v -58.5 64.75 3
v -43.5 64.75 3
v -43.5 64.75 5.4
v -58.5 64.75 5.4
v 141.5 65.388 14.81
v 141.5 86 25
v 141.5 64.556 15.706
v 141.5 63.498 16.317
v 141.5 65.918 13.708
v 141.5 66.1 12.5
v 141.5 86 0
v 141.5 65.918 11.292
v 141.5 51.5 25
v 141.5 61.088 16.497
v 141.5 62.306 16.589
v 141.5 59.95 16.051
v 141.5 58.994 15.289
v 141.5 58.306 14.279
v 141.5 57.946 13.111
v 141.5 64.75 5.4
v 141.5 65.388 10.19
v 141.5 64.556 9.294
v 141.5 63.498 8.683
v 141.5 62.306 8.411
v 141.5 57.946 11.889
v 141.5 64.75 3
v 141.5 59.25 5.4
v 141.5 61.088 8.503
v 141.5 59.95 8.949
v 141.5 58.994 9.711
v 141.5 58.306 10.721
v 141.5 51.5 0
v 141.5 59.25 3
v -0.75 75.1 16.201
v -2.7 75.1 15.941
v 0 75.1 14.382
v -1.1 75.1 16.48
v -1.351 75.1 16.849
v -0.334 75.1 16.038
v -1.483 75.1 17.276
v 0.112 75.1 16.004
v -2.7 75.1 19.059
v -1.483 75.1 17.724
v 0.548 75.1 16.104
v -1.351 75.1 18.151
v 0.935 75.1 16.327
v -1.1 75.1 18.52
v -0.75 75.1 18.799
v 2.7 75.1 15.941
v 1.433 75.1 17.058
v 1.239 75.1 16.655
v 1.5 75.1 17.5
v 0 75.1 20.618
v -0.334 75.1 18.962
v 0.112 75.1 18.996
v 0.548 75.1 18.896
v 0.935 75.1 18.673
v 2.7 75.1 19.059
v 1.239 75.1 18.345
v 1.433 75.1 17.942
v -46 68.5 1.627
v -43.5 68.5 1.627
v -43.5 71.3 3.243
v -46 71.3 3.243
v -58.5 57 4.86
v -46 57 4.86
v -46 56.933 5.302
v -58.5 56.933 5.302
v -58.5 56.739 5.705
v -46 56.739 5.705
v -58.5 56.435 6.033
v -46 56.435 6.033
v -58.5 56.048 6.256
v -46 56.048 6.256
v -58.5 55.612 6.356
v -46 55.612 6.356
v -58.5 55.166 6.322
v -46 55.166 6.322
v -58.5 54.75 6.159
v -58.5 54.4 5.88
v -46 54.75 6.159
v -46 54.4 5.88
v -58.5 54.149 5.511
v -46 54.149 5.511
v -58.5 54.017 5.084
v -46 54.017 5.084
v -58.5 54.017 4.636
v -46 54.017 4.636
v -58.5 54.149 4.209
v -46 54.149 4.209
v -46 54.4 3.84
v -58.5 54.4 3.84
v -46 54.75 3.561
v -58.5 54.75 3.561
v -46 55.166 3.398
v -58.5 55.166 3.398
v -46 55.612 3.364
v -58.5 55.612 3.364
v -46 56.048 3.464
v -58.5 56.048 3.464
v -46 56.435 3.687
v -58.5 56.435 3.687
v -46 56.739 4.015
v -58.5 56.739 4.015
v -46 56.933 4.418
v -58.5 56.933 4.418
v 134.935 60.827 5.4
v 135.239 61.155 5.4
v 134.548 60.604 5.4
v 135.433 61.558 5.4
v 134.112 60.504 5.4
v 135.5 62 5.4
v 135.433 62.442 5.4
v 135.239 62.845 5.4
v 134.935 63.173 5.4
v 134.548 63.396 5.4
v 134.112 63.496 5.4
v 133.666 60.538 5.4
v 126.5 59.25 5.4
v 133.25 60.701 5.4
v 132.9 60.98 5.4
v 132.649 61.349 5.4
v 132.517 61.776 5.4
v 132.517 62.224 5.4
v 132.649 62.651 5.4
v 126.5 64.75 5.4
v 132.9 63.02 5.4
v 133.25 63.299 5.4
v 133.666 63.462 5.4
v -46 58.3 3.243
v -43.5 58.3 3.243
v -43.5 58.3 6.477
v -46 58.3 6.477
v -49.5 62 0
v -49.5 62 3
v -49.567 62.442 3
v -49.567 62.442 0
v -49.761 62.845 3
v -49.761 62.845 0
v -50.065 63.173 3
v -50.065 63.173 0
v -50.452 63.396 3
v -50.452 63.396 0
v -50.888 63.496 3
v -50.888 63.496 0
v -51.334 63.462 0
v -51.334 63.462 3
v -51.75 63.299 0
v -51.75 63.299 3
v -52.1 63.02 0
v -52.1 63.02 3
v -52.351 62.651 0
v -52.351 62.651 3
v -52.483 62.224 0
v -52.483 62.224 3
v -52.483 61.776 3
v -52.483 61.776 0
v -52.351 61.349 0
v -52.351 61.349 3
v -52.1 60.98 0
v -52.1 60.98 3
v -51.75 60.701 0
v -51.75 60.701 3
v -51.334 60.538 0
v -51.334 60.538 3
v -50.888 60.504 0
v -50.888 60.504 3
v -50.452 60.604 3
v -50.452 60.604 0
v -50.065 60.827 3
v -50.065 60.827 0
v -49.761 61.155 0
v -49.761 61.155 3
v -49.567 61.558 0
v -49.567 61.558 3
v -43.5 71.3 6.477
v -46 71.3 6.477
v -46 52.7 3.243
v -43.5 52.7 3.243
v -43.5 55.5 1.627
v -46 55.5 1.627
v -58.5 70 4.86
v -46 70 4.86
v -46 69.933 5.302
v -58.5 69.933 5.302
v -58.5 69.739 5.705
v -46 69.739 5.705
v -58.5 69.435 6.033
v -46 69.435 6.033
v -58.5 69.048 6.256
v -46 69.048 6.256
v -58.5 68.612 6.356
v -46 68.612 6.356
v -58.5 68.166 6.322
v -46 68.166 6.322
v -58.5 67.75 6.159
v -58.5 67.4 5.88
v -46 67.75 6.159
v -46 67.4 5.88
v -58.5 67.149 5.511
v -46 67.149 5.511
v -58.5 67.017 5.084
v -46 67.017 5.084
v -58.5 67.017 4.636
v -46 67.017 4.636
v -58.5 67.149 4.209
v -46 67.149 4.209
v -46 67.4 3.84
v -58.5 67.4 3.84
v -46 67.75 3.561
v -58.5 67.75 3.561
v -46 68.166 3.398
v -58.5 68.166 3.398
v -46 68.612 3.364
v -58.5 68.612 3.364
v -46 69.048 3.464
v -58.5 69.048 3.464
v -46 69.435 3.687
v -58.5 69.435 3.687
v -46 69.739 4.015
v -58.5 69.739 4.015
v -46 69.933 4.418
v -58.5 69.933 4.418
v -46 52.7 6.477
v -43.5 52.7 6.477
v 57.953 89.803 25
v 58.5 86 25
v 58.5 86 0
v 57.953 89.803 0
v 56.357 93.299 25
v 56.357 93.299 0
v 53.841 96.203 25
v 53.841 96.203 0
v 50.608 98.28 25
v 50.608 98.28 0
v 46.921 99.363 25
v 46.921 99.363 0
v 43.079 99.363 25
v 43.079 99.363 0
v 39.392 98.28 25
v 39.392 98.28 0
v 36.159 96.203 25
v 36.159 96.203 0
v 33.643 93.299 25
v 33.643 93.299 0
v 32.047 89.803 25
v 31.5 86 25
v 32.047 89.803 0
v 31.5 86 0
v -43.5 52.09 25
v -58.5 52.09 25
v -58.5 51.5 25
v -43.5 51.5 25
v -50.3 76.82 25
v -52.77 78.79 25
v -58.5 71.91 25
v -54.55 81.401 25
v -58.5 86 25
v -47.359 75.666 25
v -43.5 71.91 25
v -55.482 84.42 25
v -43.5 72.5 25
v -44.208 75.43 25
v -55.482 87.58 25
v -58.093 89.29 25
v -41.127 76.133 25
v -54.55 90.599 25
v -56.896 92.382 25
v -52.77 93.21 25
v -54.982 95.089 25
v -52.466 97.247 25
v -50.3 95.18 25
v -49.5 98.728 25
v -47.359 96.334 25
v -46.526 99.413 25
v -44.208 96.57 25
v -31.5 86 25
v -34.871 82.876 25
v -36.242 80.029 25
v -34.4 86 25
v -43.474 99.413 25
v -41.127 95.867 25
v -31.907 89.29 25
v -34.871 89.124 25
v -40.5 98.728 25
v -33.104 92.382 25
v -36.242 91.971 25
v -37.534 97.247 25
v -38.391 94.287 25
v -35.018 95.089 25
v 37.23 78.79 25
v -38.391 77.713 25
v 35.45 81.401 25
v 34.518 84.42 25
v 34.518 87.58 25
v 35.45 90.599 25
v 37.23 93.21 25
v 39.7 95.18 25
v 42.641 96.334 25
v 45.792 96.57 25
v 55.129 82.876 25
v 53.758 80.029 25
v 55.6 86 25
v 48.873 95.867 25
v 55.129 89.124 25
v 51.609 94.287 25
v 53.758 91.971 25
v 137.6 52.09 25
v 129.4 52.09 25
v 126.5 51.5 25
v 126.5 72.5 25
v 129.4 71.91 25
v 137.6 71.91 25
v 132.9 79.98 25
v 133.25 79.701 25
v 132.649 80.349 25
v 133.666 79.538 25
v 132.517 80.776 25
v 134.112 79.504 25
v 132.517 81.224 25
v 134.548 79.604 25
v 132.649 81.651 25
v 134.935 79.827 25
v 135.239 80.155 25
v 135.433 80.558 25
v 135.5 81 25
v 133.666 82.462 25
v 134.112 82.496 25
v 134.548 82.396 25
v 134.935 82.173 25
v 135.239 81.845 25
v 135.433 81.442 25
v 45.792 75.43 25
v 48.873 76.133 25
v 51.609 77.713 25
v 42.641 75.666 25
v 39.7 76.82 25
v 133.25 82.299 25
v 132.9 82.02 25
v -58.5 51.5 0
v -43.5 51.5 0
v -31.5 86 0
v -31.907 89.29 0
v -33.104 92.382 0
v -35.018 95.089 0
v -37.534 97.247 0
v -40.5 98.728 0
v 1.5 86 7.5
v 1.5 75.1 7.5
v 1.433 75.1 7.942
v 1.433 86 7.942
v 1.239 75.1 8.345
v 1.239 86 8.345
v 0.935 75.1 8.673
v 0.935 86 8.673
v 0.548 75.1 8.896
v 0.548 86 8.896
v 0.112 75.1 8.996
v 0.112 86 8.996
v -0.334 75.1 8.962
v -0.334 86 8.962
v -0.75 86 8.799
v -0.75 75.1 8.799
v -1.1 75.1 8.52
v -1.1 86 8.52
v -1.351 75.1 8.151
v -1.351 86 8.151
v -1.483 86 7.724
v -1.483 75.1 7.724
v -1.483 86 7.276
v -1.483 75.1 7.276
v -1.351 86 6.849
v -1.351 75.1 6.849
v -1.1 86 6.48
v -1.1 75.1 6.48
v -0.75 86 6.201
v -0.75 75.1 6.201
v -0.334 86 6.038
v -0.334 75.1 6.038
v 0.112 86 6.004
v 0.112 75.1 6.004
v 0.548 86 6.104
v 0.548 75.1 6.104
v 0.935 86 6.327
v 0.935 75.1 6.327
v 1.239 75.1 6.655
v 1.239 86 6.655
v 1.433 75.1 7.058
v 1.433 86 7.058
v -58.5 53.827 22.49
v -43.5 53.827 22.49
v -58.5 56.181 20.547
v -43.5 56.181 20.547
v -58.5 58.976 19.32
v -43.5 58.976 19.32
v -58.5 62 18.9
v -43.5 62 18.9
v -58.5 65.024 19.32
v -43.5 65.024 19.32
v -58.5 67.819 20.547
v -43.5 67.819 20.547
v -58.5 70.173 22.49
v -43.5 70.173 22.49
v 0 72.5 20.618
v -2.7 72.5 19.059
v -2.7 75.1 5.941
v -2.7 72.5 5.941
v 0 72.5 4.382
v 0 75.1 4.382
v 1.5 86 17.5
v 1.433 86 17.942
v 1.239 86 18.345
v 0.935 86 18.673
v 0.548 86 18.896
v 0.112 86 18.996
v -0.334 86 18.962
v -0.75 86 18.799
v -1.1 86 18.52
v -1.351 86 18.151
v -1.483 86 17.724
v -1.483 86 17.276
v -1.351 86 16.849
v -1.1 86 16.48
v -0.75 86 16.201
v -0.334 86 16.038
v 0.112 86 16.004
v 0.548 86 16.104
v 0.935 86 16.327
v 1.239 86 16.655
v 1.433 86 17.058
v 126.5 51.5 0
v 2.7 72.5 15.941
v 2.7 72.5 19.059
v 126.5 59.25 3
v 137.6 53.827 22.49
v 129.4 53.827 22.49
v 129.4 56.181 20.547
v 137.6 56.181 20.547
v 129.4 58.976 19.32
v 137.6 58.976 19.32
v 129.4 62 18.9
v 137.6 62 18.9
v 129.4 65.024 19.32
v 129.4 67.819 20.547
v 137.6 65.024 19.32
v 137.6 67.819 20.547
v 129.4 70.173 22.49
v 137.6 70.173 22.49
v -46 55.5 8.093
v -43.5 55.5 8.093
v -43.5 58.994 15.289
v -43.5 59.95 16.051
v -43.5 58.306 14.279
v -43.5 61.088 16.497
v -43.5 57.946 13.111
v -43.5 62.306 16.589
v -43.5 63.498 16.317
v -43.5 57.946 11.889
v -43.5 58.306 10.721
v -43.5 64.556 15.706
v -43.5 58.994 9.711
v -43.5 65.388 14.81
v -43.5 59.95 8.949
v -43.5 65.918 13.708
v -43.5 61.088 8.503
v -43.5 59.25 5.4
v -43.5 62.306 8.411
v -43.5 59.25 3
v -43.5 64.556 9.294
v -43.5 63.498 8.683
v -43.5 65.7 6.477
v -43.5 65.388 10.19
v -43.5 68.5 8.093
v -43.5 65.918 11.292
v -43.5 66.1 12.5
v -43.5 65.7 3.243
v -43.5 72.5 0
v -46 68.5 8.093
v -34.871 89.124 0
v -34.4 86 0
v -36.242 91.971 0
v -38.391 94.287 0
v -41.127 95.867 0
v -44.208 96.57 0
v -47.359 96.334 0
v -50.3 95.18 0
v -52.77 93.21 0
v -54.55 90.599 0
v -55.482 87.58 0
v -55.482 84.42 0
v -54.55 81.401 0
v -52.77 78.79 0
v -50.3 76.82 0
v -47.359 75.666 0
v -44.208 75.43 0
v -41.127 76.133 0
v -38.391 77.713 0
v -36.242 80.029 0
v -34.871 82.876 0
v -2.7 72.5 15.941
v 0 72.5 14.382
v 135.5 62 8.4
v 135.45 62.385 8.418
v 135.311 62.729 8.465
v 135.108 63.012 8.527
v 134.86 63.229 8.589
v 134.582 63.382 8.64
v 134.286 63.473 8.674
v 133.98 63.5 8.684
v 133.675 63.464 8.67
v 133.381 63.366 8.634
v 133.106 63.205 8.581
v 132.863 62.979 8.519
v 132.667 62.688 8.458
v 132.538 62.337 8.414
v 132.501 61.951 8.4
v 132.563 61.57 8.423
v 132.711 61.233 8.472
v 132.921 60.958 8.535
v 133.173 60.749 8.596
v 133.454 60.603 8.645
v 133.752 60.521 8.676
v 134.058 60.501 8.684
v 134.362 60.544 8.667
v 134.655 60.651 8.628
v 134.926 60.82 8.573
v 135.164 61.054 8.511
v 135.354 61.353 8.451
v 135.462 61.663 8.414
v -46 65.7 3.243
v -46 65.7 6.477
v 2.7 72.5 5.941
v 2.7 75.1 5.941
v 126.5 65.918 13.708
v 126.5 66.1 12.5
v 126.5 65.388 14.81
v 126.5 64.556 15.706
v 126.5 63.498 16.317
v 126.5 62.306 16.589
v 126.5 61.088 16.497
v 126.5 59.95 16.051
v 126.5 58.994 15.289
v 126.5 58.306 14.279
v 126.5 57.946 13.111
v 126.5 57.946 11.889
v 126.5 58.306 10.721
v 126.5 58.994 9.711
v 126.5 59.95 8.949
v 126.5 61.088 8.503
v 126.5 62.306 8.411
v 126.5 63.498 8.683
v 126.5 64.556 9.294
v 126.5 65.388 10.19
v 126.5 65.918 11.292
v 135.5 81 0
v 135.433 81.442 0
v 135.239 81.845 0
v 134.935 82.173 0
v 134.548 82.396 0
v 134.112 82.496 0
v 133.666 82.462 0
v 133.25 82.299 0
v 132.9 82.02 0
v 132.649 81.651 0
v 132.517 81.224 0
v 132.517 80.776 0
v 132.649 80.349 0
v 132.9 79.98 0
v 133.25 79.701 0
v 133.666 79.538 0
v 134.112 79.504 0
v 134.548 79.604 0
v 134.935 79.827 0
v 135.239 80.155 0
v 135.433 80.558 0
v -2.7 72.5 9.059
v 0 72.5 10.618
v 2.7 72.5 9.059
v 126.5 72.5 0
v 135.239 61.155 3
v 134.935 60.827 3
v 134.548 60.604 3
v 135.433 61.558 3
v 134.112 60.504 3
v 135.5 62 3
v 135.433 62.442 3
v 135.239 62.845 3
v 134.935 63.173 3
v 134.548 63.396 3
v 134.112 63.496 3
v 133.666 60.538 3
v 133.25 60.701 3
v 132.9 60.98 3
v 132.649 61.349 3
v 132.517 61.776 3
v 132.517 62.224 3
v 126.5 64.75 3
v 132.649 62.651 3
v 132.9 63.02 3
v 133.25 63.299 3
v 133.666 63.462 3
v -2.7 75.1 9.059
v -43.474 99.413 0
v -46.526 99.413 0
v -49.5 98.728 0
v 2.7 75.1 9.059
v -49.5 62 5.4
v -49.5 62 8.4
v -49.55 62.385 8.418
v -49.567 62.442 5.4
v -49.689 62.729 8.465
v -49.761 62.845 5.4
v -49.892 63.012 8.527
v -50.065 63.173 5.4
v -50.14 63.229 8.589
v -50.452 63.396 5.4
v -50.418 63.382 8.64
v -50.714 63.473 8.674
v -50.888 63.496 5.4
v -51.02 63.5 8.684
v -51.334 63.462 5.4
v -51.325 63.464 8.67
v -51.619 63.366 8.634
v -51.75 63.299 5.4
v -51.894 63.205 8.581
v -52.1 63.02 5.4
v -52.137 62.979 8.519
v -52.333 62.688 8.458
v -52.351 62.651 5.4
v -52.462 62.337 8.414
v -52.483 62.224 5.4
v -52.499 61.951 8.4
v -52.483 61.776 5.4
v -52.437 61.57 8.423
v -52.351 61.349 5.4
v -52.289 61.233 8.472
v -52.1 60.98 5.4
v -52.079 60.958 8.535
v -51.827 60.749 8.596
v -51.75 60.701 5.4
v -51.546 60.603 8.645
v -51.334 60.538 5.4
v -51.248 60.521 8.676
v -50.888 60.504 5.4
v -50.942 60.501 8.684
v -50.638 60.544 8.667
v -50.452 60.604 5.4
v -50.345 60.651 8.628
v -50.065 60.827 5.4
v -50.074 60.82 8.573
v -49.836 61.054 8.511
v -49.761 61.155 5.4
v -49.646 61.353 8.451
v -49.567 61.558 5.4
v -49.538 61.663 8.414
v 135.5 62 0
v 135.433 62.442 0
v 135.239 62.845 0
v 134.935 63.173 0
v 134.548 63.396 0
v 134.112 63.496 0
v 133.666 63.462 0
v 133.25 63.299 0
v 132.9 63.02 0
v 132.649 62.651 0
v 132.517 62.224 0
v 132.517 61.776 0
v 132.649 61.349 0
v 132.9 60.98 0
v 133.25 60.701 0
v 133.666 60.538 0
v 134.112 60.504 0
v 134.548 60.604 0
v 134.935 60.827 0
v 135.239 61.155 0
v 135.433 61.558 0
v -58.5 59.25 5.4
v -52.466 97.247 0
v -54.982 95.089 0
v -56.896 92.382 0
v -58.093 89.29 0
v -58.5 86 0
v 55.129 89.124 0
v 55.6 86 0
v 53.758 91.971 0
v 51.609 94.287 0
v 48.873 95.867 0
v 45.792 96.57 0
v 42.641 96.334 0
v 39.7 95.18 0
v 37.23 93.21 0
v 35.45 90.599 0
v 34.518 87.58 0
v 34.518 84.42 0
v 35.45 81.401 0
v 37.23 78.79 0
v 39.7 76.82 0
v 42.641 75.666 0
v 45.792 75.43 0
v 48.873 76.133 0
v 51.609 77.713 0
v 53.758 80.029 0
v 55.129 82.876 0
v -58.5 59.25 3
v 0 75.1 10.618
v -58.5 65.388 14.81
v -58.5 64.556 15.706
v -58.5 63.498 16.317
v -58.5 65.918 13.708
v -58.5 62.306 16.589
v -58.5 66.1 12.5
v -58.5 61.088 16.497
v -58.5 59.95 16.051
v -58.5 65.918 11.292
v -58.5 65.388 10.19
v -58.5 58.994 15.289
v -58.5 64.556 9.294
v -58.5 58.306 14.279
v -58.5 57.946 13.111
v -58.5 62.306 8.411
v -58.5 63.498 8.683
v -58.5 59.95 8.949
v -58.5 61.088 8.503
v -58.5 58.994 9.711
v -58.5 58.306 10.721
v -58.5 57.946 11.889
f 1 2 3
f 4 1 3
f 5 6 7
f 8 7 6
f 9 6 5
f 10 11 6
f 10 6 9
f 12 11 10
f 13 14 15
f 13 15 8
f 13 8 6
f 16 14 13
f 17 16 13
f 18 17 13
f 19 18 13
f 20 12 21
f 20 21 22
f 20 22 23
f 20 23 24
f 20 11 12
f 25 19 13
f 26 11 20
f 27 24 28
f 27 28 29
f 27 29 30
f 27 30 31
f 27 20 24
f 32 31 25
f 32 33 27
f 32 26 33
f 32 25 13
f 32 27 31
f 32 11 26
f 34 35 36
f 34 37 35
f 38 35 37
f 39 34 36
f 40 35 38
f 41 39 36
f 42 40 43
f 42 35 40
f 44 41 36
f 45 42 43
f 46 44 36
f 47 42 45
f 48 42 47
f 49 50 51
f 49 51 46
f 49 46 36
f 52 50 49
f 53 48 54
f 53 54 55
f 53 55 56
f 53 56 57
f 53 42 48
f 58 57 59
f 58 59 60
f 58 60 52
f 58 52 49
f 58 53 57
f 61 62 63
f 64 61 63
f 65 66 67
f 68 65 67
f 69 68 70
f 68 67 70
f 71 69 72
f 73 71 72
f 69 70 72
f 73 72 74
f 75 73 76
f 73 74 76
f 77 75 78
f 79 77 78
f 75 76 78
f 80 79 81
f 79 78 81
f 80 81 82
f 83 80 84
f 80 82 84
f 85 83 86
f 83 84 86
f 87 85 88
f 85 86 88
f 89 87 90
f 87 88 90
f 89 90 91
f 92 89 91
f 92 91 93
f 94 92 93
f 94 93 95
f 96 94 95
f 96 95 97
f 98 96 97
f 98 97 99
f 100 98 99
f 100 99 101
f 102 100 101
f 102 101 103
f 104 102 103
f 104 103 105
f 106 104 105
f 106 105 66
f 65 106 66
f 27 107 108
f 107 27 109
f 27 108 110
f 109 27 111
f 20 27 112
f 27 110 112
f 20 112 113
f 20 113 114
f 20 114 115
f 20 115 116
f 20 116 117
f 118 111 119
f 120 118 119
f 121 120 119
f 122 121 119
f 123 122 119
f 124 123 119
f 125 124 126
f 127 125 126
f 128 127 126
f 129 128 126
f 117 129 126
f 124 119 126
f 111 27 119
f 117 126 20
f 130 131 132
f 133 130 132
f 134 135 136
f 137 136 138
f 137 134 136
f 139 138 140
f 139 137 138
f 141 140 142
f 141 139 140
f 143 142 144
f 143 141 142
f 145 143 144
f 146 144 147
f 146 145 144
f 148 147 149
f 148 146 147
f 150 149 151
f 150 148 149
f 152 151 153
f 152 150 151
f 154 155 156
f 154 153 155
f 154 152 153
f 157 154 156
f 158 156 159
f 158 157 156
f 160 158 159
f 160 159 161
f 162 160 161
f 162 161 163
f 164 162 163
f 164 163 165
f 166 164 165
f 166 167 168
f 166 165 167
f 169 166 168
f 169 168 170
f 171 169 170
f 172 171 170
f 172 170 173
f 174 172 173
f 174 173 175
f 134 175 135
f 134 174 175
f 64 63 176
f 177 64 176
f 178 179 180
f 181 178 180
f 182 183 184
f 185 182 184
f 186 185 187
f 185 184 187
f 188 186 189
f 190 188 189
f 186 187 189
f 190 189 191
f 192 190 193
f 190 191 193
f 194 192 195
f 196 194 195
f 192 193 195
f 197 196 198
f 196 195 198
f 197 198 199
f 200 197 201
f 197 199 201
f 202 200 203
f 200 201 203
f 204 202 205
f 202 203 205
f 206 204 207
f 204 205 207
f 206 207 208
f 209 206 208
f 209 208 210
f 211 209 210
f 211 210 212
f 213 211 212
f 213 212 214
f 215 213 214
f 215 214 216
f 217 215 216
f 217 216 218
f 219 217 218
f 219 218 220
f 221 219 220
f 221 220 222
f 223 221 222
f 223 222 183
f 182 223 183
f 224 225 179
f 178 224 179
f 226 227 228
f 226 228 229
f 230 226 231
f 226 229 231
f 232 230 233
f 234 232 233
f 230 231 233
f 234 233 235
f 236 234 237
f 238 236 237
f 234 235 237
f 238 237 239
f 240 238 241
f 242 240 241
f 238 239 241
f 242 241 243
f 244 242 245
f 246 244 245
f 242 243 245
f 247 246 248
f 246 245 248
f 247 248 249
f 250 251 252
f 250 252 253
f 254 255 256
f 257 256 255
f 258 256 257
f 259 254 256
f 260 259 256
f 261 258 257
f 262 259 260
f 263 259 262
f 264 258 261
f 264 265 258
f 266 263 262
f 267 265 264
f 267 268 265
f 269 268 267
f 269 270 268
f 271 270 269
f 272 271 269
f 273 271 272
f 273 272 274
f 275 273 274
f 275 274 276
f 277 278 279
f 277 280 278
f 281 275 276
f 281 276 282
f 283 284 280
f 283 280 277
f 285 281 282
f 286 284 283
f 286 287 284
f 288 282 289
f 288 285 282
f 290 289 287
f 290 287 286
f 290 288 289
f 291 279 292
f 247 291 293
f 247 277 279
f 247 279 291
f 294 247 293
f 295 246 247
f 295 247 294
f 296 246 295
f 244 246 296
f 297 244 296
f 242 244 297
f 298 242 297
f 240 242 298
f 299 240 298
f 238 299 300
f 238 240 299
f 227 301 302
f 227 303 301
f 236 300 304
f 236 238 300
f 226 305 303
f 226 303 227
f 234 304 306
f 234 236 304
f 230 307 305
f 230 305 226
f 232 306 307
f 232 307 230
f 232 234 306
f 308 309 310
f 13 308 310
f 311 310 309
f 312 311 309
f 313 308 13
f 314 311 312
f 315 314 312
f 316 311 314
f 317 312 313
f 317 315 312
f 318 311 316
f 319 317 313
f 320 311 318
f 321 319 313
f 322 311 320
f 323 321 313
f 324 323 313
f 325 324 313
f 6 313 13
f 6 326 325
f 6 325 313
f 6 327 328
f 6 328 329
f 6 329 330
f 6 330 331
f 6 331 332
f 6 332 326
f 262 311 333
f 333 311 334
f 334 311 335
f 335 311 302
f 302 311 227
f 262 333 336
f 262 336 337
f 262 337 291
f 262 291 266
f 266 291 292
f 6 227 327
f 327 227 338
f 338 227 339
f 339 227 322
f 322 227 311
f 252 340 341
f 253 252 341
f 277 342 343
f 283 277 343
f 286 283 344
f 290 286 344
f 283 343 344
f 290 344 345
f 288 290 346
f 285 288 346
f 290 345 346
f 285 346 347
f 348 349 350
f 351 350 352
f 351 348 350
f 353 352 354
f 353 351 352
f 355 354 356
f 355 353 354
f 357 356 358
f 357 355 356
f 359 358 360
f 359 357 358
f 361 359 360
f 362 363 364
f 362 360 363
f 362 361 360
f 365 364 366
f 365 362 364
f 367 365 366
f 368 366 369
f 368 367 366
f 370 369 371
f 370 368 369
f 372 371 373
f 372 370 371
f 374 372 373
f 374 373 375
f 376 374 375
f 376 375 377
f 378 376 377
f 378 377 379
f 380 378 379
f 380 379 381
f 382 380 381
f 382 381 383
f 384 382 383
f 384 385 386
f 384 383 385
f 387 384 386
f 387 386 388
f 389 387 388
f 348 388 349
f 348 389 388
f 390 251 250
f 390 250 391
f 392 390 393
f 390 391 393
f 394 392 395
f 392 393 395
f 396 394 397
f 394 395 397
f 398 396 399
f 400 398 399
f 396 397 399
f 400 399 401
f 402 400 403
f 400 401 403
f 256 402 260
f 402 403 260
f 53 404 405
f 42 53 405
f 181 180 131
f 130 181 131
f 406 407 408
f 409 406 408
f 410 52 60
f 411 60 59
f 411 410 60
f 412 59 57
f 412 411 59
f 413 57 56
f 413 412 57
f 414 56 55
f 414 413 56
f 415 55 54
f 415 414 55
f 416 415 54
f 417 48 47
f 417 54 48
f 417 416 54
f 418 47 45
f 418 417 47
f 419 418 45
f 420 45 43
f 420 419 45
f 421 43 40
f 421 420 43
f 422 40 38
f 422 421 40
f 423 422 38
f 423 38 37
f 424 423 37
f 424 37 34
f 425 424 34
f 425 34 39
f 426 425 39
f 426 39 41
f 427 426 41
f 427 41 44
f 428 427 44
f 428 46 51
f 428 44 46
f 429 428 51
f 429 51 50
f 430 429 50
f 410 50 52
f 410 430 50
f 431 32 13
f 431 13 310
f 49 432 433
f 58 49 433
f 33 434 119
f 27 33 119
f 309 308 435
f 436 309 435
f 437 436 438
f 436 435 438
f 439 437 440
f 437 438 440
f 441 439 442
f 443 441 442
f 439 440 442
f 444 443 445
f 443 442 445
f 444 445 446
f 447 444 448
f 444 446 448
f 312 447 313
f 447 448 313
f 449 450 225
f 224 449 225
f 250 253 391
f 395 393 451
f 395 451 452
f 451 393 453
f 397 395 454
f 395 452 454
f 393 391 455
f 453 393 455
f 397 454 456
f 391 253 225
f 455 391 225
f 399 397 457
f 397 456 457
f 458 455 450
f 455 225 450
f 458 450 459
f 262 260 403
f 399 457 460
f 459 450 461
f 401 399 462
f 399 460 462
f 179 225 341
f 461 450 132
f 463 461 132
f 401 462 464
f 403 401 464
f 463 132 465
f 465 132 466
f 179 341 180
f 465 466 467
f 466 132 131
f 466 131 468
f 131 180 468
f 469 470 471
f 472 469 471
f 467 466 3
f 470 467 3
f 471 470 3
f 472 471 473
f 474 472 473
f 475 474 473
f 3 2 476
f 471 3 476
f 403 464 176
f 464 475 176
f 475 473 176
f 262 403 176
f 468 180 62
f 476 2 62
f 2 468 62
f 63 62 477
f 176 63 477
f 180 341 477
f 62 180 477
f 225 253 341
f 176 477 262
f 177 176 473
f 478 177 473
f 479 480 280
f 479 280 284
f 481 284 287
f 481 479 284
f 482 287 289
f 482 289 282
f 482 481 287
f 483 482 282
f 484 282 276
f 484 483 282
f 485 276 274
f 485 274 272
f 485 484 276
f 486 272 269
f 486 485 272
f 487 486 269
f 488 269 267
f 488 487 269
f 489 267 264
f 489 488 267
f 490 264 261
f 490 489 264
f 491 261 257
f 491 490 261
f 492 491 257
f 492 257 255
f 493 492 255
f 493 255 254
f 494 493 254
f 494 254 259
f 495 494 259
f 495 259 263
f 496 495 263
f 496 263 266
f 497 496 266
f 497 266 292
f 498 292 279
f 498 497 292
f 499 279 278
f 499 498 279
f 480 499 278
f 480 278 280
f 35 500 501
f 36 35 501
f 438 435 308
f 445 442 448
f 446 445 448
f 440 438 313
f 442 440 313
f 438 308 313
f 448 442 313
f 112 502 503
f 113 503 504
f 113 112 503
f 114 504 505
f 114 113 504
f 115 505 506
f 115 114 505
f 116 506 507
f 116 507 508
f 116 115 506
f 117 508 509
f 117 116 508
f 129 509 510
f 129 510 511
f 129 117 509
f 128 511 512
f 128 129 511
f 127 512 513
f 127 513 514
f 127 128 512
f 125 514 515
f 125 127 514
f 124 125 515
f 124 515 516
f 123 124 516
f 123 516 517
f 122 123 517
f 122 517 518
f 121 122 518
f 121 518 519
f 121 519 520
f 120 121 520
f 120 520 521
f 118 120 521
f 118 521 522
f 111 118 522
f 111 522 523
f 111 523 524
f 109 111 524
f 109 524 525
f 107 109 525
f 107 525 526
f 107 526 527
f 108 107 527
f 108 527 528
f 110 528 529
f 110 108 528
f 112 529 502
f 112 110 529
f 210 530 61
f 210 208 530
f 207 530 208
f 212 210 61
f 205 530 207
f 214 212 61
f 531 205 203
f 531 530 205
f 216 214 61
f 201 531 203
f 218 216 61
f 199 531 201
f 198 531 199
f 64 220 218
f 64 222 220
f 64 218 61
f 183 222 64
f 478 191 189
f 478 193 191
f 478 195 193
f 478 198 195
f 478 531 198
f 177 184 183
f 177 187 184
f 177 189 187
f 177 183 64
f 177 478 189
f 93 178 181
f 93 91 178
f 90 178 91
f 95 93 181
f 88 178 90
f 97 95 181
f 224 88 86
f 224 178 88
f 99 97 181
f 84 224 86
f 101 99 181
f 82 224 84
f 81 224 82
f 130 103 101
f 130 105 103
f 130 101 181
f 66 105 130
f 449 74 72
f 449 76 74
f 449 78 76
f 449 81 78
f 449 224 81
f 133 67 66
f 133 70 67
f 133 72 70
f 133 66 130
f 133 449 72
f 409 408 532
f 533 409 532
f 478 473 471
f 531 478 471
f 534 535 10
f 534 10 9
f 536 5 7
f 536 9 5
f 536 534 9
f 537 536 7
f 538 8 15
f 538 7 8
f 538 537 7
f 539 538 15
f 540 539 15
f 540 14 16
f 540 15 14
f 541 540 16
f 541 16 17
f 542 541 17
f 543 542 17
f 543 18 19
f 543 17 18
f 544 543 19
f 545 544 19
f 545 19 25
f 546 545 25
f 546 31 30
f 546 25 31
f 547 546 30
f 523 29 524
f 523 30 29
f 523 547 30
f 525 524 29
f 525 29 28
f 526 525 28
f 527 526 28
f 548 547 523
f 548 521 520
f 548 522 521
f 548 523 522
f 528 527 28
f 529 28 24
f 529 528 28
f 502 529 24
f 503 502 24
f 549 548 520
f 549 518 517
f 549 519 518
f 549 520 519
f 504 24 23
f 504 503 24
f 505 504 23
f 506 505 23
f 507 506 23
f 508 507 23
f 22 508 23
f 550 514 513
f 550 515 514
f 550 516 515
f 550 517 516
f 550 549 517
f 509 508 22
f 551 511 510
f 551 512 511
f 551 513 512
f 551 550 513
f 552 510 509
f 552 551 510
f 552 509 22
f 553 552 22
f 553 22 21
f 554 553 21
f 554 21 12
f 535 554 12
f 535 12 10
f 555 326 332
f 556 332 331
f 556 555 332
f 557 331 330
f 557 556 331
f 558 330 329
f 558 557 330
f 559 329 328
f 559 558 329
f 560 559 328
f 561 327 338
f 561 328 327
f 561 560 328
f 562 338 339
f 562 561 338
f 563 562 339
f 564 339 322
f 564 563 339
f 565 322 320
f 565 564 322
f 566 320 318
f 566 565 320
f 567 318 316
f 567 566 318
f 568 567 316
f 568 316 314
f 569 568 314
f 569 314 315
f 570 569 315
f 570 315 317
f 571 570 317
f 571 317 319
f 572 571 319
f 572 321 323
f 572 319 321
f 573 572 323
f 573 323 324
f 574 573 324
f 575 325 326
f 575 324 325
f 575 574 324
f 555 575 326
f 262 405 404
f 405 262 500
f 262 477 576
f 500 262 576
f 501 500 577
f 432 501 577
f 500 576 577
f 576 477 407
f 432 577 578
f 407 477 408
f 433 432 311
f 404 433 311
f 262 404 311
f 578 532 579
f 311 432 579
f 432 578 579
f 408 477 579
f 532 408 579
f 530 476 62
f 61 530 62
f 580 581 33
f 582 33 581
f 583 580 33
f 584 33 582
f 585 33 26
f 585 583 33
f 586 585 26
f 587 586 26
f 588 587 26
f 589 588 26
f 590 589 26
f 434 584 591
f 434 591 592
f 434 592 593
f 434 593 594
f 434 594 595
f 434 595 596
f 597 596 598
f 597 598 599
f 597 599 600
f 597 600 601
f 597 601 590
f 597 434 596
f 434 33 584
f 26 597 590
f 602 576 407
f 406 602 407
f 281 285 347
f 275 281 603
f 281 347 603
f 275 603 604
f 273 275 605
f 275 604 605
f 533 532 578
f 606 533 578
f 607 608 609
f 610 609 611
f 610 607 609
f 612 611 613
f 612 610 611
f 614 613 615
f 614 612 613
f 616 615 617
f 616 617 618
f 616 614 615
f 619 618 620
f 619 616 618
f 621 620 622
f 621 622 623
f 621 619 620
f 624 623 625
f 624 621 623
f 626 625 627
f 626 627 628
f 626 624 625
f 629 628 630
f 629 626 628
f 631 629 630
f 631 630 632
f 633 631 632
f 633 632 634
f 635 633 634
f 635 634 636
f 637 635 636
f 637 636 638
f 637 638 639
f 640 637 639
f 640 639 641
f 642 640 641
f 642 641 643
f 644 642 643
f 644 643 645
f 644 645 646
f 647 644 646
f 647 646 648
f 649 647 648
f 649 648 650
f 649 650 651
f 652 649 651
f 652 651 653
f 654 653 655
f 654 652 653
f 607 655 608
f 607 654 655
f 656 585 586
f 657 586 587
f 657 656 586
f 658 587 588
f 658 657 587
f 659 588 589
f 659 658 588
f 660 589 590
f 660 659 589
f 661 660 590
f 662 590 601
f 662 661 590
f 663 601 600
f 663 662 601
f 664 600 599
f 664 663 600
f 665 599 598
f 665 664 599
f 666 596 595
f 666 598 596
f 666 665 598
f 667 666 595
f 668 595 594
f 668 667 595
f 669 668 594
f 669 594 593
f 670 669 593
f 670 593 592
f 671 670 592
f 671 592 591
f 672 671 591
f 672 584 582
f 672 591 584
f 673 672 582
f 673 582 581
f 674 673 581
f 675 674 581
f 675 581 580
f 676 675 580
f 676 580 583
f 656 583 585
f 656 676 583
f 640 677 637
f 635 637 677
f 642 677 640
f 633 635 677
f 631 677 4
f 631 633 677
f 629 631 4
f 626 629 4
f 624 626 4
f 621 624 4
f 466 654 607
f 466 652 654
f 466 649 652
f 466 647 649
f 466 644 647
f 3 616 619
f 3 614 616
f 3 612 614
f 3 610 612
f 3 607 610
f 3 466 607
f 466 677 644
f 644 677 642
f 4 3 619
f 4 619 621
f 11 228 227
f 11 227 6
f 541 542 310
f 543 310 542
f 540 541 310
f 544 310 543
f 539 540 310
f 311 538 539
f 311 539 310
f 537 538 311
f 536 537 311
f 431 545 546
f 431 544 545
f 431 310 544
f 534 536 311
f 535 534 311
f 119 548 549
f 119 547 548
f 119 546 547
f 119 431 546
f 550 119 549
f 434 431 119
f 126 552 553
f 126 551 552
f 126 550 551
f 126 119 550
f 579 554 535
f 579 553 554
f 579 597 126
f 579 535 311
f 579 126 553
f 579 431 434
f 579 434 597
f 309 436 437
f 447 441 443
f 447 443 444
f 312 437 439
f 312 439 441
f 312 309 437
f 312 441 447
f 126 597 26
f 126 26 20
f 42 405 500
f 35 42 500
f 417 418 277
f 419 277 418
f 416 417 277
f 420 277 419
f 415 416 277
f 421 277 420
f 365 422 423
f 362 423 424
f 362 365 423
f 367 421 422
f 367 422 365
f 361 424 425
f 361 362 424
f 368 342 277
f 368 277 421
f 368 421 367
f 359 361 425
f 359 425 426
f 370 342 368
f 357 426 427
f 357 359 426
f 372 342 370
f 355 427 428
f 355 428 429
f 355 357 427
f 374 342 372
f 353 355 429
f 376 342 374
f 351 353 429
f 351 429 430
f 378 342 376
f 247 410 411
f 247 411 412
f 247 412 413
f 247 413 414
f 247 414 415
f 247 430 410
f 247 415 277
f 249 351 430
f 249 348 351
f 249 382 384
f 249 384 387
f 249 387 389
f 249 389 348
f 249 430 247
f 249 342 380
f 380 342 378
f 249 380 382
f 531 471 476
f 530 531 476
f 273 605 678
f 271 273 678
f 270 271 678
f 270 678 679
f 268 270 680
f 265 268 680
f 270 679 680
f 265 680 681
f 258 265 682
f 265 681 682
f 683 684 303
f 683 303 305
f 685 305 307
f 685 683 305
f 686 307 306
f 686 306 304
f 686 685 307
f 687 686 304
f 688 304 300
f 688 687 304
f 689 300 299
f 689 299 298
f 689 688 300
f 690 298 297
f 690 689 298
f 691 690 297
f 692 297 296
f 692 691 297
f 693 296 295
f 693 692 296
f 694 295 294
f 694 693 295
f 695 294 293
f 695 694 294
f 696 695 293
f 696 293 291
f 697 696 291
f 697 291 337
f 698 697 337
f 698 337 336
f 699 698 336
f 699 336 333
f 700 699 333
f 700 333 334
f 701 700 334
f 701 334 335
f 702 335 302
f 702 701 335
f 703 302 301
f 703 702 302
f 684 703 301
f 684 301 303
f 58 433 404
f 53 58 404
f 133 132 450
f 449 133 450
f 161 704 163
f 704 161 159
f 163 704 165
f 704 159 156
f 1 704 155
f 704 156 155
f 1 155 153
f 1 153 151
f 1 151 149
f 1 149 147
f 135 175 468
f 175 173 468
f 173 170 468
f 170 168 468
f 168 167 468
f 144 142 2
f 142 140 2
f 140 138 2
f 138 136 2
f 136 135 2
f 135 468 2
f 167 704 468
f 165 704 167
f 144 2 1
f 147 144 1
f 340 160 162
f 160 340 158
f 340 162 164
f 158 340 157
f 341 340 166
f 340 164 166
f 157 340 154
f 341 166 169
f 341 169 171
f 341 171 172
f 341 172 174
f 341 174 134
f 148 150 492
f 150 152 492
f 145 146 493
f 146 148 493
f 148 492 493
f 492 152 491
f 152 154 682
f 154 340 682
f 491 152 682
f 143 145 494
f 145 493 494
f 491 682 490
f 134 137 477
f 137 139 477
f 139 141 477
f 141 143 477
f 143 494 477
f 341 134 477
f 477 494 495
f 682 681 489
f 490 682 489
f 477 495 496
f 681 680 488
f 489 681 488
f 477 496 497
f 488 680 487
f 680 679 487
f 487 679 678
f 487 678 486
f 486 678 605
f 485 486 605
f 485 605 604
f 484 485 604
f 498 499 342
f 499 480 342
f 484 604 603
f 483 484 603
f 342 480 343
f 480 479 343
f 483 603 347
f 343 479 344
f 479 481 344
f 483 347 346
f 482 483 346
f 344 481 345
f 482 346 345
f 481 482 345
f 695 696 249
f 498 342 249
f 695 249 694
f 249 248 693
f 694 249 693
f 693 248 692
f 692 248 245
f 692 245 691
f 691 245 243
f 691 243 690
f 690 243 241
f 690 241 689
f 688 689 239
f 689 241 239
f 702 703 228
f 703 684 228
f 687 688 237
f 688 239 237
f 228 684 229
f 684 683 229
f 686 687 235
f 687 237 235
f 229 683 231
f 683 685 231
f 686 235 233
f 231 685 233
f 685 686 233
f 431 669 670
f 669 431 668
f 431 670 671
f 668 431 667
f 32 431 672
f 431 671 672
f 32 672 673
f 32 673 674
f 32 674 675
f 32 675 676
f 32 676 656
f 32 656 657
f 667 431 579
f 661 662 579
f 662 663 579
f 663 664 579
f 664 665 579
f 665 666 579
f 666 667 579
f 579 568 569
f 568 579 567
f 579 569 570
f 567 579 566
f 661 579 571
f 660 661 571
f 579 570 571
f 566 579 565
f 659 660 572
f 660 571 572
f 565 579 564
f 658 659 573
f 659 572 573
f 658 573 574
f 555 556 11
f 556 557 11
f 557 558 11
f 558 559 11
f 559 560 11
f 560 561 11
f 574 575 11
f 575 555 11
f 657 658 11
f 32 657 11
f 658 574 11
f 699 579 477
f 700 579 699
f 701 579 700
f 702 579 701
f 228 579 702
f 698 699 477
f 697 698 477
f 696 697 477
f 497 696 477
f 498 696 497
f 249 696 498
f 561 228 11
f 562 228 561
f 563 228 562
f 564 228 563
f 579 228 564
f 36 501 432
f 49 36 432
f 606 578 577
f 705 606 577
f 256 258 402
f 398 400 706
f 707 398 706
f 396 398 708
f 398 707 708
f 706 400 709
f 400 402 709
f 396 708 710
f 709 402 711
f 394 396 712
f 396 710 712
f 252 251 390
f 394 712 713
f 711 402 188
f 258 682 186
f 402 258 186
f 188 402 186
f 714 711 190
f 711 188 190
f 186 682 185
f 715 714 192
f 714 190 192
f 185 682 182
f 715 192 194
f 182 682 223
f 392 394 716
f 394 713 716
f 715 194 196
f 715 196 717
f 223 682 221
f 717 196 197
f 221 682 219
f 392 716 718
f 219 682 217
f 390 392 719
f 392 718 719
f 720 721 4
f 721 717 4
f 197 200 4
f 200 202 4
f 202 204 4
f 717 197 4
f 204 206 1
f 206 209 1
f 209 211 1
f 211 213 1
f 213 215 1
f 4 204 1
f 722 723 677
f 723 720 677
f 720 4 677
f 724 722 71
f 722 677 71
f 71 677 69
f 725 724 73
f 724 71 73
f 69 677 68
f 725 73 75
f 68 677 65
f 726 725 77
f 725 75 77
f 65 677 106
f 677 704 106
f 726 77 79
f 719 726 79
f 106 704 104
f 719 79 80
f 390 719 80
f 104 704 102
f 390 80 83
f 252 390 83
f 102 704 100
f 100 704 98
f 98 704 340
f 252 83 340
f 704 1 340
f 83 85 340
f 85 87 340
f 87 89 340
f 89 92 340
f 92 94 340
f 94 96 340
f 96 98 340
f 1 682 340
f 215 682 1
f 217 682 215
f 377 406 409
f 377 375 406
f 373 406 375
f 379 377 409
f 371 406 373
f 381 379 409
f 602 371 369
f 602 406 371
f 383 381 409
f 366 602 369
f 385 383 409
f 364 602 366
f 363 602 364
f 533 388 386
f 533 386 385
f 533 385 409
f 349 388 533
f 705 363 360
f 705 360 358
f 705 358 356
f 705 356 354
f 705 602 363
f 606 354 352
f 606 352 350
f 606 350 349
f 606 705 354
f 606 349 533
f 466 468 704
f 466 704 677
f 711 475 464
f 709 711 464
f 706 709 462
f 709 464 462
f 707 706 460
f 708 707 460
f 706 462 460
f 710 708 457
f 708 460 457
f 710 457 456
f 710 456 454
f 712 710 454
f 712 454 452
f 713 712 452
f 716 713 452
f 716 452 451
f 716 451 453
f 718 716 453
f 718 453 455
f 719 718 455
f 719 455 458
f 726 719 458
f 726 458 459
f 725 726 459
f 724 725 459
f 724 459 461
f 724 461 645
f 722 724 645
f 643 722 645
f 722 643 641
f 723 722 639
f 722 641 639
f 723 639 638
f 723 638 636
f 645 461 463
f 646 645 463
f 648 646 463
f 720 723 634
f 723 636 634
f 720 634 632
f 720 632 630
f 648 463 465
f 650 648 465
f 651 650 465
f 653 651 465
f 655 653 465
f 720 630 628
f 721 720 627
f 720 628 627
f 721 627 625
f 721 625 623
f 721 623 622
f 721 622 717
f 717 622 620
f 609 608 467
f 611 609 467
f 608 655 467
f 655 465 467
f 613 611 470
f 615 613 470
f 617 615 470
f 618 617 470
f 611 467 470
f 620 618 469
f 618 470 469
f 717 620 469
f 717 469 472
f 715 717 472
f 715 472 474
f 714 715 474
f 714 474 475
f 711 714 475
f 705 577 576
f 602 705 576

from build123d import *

# Parameters (mm, degrees)
SKETCH007_R          = 10.6
PAD006_DEPTH         = 25
SKETCH016_R          = 4.1
SKETCH016_W          = 5.5
SKETCH016_H          = 2.4
POCKET008_DEPTH      = 58.501
POCKET008_DEPTH_BACK = 141.501
SKETCH024_R          = 11.1
SKETCH024_R_2        = 4.09
POCKET013_DEPTH      = 4.1
SKETCH025_R          = 1.5
POCKET014_DEPTH      = 13.501
POCKET014_DEPTH_BACK = 34.501
POCKET015_DEPTH      = 2.6
SKETCH027_R          = 1.5
POCKET016_DEPTH      = 12.5
SKETCH028_R          = 1.5
POCKET017_DEPTH      = 58.5010001
POCKET018_DEPTH      = 2.5
SKETCH032_R          = 1.5
POCKET019_DEPTH      = 0.001
POCKET019_DEPTH_BACK = 25.001
SKETCH033_R          = 11.1
POCKET020_DEPTH      = 58.5010001


with BuildPart() as part:
    # Sketch007 → Pad006 (new body)
    with BuildSketch(Plane.XY):
        with BuildLine():
            ThreePointArc((-31.5, 0), (-33.9772961575, 7.7942286341), (-40.5, 12.7279220614))
            ThreePointArc((-40.5, 12.7279220614), (-45, 13.5), (-49.5, 12.7279220614))
            ThreePointArc((-49.5, 12.7279220614), (-56.0227038425, 7.7942286341), (-58.5, 0))
            Line((-58.5, 0), (-58.5, -13.5))
            Line((-58.5, -17.2720779386), (-58.5, -13.5))
            Line((-58.5, -17.2720779386), (-58.5, -34.5))
            Line((-58.5, -34.5), (-43.5, -34.5))
            Line((-43.5, -34.5), (-43.5, -17.2720779386))
            Line((-43.5, -13.5), (-43.5, -17.2720779386))
            Line((-43.5, -13.5), (126.5, -13.5))
            Line((126.5, -34.5), (126.5, -13.5))
            Line((141.5, -34.5), (126.5, -34.5))
            Line((141.5, -13.5), (141.5, -34.5))
            Line((141.5, 0), (141.5, -13.5))
            Line((126.5, 0), (141.5, 0))
            Line((58.5, 0), (126.5, 0))
            ThreePointArc((58.5, 0), (45, 13.5), (31.5, 0))
            Line((-31.5, 0), (31.5, 0))
        make_face()
        with Locations((-45, 0)):
            Circle(SKETCH007_R, mode=Mode.SUBTRACT)
        with Locations((45, 0)):
            Circle(SKETCH007_R, mode=Mode.SUBTRACT)
    extrude(amount=PAD006_DEPTH)

    # Sketch016 → Pocket008 (cut, two sides)
    with BuildSketch(Plane.YZ) as pocket008_sk:
        with Locations((-24, 12.5)):
            Circle(SKETCH016_R)
        with Locations((-24, 4.2)):
            Rectangle(SKETCH016_W, SKETCH016_H)
    extrude(amount=-POCKET008_DEPTH, mode=Mode.SUBTRACT)
    extrude(pocket008_sk.sketch, amount=POCKET008_DEPTH_BACK, mode=Mode.SUBTRACT)

    # Sketch024 → Pocket013 (cut, symmetric)
    with BuildSketch(Plane.YZ.offset(133.5)):
        with Locations((-24, 30)):
            Circle(SKETCH024_R)
        with Locations((-24, 30)):
            Circle(SKETCH024_R_2, mode=Mode.SUBTRACT)
    extrude(amount=POCKET013_DEPTH, both=True, mode=Mode.SUBTRACT)

    # Sketch025 → Pocket014 (cut, two sides)
    with BuildSketch(Plane.XZ) as pocket014_sk:
        with Locations((0, 17.5)):
            Circle(SKETCH025_R)
        with Locations((0, 7.5)):
            Circle(SKETCH025_R)
    extrude(amount=-POCKET014_DEPTH, mode=Mode.SUBTRACT)
    extrude(pocket014_sk.sketch, amount=POCKET014_DEPTH_BACK, mode=Mode.SUBTRACT)

    # Sketch026 → Pocket015 (cut)
    with BuildSketch(Plane.XZ.offset(13.5)):
        Polygon((2.7, 19.0588457268), (0, 20.6176914536), (-2.7, 19.0588457268), (-2.7, 15.9411542732), (0, 14.3823085464), (2.7, 15.9411542732), align=None)
        Polygon((2.7, 9.0588457268), (0, 10.6176914536), (-2.7, 9.0588457268), (-2.7, 5.9411542732), (0, 4.3823085464), (2.7, 5.9411542732), align=None)
    extrude(amount=-POCKET015_DEPTH, mode=Mode.SUBTRACT)

    # Sketch027 → Pocket016 (cut)
    with BuildSketch(Plane.XY):
        with Locations((-51, -24)):
            Circle(SKETCH027_R)
        with Locations((134, -24)):
            Circle(SKETCH027_R)
    extrude(amount=POCKET016_DEPTH, mode=Mode.SUBTRACT)

    # Sketch028 → Pocket017 (cut, through all)
    with BuildSketch(Plane.YZ):
        with Locations((-30.5, 4.86)):
            Circle(SKETCH028_R)
        with Locations((-17.5, 4.86)):
            Circle(SKETCH028_R)
    extrude(amount=-POCKET017_DEPTH, mode=Mode.SUBTRACT)

    # Sketch029 → Pocket018 (cut)
    with BuildSketch(Plane.YZ.offset(-43.5)):
        Polygon((-27.7, 6.4765807537), (-30.5, 8.0931615075), (-33.3, 6.4765807537), (-33.3, 3.2434192463), (-30.5, 1.6268384925), (-27.7, 3.2434192463), align=None)
        Polygon((-20.3, 6.4765807537), (-20.3, 3.2434192463), (-17.5, 1.6268384925), (-14.7, 3.2434192463), (-14.7, 6.4765807537), (-17.5, 8.0931615075), align=None)
    extrude(amount=-POCKET018_DEPTH, mode=Mode.SUBTRACT)

    # Sketch032 → Pocket019 (cut, two sides)
    with BuildSketch(Plane.XY) as pocket019_sk:
        with Locations((134, -5)):
            Circle(SKETCH032_R)
    extrude(amount=-POCKET019_DEPTH, mode=Mode.SUBTRACT)
    extrude(pocket019_sk.sketch, amount=POCKET019_DEPTH_BACK, mode=Mode.SUBTRACT)

    # Sketch033 → Pocket020 (cut, through all)
    with BuildSketch(Plane.YZ):
        with Locations((-24, 30)):
            Circle(SKETCH033_R)
    extrude(amount=-POCKET020_DEPTH, mode=Mode.SUBTRACT)


with BuildPart() as part_1:
    # Body005 placement: moved
    add(part.part.moved(Location((0, 86, 0))))


solid = part_1.part
